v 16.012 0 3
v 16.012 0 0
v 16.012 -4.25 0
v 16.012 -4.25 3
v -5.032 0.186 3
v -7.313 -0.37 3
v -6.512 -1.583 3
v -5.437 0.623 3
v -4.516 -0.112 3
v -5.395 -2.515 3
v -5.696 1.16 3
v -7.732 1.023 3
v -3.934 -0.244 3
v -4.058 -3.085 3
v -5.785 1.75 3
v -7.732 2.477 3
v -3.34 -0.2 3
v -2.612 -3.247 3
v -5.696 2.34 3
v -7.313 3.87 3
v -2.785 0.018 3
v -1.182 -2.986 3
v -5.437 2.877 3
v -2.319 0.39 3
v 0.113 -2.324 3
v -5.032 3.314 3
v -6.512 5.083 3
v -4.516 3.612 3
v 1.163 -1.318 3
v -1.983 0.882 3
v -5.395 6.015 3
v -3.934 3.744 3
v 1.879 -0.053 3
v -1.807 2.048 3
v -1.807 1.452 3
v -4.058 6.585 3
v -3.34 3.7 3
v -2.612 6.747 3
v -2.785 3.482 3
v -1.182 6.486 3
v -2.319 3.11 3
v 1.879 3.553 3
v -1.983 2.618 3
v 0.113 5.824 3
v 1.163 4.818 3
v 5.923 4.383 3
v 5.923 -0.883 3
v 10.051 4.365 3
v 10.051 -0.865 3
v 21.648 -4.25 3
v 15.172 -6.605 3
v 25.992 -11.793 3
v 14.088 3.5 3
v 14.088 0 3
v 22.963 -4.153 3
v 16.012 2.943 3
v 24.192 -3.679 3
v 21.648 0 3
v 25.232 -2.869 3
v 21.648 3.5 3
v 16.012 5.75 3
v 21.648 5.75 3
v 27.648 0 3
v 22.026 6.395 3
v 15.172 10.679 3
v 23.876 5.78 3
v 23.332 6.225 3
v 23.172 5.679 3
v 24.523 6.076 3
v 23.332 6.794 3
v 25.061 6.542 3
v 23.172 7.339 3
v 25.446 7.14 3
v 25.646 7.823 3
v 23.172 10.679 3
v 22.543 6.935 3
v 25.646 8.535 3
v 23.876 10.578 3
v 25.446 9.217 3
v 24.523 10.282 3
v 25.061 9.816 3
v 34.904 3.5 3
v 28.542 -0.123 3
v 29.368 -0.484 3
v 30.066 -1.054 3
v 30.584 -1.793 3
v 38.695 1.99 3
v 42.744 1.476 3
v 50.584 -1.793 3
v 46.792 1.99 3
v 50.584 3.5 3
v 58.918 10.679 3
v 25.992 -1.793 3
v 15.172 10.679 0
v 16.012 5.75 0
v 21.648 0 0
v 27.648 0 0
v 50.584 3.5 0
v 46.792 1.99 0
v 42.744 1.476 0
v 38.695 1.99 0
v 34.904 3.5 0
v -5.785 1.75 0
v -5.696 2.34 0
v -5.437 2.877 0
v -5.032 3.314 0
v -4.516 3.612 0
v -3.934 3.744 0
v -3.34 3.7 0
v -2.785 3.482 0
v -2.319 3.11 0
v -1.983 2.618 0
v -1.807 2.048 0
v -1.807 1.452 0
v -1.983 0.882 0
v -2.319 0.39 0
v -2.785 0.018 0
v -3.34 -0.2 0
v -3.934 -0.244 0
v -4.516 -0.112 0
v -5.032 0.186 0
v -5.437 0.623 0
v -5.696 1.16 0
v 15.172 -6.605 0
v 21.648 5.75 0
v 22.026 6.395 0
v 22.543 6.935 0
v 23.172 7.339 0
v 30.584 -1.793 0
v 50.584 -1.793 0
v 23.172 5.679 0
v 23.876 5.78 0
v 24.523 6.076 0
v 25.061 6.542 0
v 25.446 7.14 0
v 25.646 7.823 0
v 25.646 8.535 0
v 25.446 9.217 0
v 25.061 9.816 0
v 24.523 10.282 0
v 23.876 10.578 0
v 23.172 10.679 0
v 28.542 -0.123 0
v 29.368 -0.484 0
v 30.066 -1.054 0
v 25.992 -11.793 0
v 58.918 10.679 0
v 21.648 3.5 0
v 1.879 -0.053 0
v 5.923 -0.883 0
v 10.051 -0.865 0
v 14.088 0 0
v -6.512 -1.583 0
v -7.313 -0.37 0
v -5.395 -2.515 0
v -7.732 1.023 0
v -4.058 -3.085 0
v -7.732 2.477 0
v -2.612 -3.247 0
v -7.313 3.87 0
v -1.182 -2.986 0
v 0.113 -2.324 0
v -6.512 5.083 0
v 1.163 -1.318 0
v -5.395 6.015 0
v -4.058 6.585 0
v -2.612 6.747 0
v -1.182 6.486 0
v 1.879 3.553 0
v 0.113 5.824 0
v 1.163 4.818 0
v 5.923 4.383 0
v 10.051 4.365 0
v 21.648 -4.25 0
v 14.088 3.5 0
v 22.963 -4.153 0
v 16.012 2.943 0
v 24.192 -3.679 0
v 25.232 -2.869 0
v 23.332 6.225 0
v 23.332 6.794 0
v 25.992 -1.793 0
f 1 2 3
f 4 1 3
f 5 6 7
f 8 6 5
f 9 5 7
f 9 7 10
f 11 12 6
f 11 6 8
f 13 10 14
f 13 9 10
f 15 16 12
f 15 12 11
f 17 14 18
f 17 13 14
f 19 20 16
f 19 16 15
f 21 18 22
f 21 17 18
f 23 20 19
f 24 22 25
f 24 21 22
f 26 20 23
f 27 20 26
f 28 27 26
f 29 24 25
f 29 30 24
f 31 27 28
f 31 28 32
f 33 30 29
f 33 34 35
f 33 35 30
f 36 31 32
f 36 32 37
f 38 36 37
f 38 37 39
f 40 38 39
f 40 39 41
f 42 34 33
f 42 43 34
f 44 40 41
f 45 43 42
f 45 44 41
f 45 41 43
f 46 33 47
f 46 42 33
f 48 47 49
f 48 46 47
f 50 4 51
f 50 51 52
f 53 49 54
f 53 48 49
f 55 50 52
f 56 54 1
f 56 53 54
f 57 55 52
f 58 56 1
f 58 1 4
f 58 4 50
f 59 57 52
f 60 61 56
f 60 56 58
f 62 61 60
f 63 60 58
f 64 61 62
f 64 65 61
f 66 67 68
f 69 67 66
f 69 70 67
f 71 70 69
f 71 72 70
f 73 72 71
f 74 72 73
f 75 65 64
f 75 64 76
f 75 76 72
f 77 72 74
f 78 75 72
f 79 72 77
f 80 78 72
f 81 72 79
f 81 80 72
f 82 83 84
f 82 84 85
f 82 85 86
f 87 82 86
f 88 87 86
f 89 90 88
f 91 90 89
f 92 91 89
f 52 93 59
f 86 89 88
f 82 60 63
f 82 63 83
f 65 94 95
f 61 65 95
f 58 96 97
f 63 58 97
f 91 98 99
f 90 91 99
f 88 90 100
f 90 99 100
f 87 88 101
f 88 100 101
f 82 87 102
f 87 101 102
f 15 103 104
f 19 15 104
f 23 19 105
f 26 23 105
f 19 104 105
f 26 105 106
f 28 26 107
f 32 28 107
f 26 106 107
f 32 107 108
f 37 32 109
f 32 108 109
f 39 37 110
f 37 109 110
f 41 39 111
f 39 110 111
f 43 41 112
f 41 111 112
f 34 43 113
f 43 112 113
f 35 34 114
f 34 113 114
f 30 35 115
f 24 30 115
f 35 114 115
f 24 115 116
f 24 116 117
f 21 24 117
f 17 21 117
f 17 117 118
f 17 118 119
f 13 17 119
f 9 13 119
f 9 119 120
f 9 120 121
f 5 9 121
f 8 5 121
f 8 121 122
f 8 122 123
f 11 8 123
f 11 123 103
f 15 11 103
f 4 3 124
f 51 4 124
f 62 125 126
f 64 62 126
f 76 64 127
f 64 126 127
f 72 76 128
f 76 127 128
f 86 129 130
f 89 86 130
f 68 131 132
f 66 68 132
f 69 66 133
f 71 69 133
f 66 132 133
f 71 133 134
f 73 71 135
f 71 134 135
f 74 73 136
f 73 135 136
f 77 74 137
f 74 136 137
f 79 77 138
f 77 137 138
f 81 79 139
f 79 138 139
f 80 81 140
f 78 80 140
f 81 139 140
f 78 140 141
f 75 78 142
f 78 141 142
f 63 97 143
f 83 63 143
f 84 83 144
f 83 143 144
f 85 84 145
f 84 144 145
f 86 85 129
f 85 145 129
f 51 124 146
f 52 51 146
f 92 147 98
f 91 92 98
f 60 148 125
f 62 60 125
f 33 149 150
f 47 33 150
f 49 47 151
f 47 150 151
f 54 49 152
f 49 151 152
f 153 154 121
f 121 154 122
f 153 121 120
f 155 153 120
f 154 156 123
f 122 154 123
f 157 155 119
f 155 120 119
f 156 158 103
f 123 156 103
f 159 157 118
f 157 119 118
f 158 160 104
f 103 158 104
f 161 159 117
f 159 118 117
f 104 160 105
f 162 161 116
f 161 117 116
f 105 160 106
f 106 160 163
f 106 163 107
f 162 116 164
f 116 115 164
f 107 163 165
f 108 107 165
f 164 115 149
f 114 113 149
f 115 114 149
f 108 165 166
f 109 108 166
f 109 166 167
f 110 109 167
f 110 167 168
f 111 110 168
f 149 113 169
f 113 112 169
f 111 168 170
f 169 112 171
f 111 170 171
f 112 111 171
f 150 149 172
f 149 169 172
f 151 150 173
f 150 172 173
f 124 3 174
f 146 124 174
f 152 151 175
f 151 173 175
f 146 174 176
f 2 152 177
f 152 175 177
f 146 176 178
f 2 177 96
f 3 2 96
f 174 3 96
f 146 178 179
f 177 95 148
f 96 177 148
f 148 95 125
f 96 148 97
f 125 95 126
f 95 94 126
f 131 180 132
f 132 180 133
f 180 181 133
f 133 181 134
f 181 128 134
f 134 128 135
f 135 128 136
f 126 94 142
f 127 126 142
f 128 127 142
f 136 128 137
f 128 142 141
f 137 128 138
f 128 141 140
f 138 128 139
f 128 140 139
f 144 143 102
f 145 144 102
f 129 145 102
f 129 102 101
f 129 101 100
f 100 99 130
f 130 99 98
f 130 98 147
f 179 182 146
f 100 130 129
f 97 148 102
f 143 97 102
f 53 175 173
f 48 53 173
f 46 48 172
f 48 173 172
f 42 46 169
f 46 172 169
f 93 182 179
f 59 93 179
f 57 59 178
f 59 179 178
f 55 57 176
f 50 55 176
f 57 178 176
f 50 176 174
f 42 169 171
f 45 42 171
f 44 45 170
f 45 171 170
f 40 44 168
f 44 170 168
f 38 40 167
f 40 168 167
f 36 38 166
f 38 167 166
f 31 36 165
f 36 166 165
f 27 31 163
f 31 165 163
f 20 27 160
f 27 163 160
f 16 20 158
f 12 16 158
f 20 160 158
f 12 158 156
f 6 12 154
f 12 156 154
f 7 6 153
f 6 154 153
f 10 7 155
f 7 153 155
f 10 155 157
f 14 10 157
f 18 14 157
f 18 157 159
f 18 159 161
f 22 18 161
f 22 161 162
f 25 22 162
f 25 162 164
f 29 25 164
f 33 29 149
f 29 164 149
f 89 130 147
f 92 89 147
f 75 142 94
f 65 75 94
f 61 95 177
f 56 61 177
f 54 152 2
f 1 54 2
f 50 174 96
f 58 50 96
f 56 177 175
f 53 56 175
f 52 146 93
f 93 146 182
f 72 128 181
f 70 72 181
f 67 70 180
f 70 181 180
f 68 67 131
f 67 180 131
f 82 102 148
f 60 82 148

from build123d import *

# Parameters (mm, degrees)
F1_DEPTH = 3
F3_D     = 4


# Not quite as in the source:
# - a feature names something its author has since deleted; it is built from what else it names


with BuildPart() as f1:
    # F0 (on Top) → F1 (new body)
    with BuildSketch(Plane.XY):
        with BuildLine():
            Line((14.0881506171, 0), (14.0881506171, 3.5))
            ThreePointArc((14.0881506171, 3.5), (7.9876115371, 4.4807007673), (1.8788639221, 3.5525016304))
            ThreePointArc((1.8788639221, 3.5525016304), (2.1302987541, 2.666794093), (2.2150684857, 1.75))
            ThreePointArc((2.2150684857, 1.75), (2.1302987541, 0.833205907), (1.8788639221, -0.0525016304))
            ThreePointArc((1.8788639221, -0.0525016304), (7.9876115371, -0.9807007673), (14.0881506171, 0))
        make_face()
        with BuildLine():
            Line((21.6484292713, 3.5), (21.6484292713, 0))
            Line((21.6484292713, 0), (27.6484292713, 0))
            ThreePointArc((27.6484292713, 0), (29.3682210792, -0.4835632197), (30.5839958787, -1.7925356741))
            Line((30.5839958787, -1.7925356741), (50.5839958787, -1.7925356741))
            Line((50.5839958787, -1.7925356741), (58.9184745012, 10.6788903105))
            Line((58.9184745012, 10.6788903105), (50.5839958787, 3.5))
            ThreePointArc((50.5839958787, 3.5), (42.7439688076, 1.4762635236), (34.9039417364, 3.5))
            Line((34.9039417364, 3.5), (21.6484292713, 3.5))
        make_face()
        with BuildLine():
            Line((16.0120092332, 2.9430498835), (14.0881506171, 3.5))
            Line((14.0881506171, 3.5), (14.0881506171, 0))
            Line((14.0881506171, 0), (16.0120092332, 0))
            Line((16.0120092332, 0), (16.0120092332, -4.25))
            Line((16.0120092332, -4.25), (15.1717471866, -6.6045614651))
            Line((15.1717471866, -6.6045614651), (25.9923258961, -11.7925356741))
            Line((25.9923258961, -11.7925356741), (25.9923258961, -1.7925356741))
            ThreePointArc((25.9923258961, -1.7925356741), (24.192277602, -3.6786508222), (21.6484292713, -4.25))
            Line((21.6484292713, -4.25), (21.6484292713, 0))
            Line((21.6484292713, 0), (21.6484292713, 3.5))
            Line((21.6484292713, 3.5), (21.6484292713, 5.75))
            ThreePointArc((21.6484292713, 5.75), (22.2690927393, 6.6798640271), (23.1717471866, 7.3394739101))
            ThreePointArc((23.1717471866, 7.3394739101), (23.3522374925, 6.5091821103), (23.1717471866, 5.6788903105))
            ThreePointArc((23.1717471866, 5.6788903105), (25.6717471866, 8.1788903105), (23.1717471866, 10.6788903105))
            Line((23.1717471866, 10.6788903105), (15.1717471866, 10.6788903105))
            Line((15.1717471866, 10.6788903105), (16.0120092332, 5.75))
            Line((16.0120092332, 5.75), (16.0120092332, 2.9430498835))
        make_face()
        with BuildLine():
            ThreePointArc((1.7150684857, 3.5), (1.7969097631, 3.5264269002), (1.8788639221, 3.5525016304))
            ThreePointArc((1.8788639221, 3.5525016304), (-7.7849315143, 1.75), (1.8788639221, -0.0525016304))
            ThreePointArc((1.8788639221, -0.0525016304), (1.7969097631, -0.0264269002), (1.7150684857, 0))
            Line((1.7150684857, 0), (1.7150684857, 1.75))
            Line((1.7150684857, 1.75), (1.7150684857, 3.5))
        make_face()
        with BuildLine():
            ThreePointArc((2.2150684857, 1.75), (2.1302987541, 2.666794093), (1.8788639221, 3.5525016304))
            ThreePointArc((1.8788639221, 3.5525016304), (1.7969097631, 3.5264269002), (1.7150684857, 3.5))
            Line((1.7150684857, 3.5), (1.7150684857, 1.75))
            Line((1.7150684857, 1.75), (2.2150684857, 1.75))
        make_face()
        with BuildLine():
            ThreePointArc((1.8788639221, -0.0525016304), (2.1302987541, 0.833205907), (2.2150684857, 1.75))
            Line((2.2150684857, 1.75), (1.7150684857, 1.75))
            Line((1.7150684857, 1.75), (1.7150684857, 0))
            ThreePointArc((1.7150684857, 0), (1.7969097631, -0.0264269002), (1.8788639221, -0.0525016304))
        make_face()
    extrude(amount=F1_DEPTH)

    # F3 (through all)
    with Locations(Plane.XY.offset(3)):
        with Locations((-3.7849315143, 1.7499999964)):
            Hole(F3_D / 2)


solid = f1.part
